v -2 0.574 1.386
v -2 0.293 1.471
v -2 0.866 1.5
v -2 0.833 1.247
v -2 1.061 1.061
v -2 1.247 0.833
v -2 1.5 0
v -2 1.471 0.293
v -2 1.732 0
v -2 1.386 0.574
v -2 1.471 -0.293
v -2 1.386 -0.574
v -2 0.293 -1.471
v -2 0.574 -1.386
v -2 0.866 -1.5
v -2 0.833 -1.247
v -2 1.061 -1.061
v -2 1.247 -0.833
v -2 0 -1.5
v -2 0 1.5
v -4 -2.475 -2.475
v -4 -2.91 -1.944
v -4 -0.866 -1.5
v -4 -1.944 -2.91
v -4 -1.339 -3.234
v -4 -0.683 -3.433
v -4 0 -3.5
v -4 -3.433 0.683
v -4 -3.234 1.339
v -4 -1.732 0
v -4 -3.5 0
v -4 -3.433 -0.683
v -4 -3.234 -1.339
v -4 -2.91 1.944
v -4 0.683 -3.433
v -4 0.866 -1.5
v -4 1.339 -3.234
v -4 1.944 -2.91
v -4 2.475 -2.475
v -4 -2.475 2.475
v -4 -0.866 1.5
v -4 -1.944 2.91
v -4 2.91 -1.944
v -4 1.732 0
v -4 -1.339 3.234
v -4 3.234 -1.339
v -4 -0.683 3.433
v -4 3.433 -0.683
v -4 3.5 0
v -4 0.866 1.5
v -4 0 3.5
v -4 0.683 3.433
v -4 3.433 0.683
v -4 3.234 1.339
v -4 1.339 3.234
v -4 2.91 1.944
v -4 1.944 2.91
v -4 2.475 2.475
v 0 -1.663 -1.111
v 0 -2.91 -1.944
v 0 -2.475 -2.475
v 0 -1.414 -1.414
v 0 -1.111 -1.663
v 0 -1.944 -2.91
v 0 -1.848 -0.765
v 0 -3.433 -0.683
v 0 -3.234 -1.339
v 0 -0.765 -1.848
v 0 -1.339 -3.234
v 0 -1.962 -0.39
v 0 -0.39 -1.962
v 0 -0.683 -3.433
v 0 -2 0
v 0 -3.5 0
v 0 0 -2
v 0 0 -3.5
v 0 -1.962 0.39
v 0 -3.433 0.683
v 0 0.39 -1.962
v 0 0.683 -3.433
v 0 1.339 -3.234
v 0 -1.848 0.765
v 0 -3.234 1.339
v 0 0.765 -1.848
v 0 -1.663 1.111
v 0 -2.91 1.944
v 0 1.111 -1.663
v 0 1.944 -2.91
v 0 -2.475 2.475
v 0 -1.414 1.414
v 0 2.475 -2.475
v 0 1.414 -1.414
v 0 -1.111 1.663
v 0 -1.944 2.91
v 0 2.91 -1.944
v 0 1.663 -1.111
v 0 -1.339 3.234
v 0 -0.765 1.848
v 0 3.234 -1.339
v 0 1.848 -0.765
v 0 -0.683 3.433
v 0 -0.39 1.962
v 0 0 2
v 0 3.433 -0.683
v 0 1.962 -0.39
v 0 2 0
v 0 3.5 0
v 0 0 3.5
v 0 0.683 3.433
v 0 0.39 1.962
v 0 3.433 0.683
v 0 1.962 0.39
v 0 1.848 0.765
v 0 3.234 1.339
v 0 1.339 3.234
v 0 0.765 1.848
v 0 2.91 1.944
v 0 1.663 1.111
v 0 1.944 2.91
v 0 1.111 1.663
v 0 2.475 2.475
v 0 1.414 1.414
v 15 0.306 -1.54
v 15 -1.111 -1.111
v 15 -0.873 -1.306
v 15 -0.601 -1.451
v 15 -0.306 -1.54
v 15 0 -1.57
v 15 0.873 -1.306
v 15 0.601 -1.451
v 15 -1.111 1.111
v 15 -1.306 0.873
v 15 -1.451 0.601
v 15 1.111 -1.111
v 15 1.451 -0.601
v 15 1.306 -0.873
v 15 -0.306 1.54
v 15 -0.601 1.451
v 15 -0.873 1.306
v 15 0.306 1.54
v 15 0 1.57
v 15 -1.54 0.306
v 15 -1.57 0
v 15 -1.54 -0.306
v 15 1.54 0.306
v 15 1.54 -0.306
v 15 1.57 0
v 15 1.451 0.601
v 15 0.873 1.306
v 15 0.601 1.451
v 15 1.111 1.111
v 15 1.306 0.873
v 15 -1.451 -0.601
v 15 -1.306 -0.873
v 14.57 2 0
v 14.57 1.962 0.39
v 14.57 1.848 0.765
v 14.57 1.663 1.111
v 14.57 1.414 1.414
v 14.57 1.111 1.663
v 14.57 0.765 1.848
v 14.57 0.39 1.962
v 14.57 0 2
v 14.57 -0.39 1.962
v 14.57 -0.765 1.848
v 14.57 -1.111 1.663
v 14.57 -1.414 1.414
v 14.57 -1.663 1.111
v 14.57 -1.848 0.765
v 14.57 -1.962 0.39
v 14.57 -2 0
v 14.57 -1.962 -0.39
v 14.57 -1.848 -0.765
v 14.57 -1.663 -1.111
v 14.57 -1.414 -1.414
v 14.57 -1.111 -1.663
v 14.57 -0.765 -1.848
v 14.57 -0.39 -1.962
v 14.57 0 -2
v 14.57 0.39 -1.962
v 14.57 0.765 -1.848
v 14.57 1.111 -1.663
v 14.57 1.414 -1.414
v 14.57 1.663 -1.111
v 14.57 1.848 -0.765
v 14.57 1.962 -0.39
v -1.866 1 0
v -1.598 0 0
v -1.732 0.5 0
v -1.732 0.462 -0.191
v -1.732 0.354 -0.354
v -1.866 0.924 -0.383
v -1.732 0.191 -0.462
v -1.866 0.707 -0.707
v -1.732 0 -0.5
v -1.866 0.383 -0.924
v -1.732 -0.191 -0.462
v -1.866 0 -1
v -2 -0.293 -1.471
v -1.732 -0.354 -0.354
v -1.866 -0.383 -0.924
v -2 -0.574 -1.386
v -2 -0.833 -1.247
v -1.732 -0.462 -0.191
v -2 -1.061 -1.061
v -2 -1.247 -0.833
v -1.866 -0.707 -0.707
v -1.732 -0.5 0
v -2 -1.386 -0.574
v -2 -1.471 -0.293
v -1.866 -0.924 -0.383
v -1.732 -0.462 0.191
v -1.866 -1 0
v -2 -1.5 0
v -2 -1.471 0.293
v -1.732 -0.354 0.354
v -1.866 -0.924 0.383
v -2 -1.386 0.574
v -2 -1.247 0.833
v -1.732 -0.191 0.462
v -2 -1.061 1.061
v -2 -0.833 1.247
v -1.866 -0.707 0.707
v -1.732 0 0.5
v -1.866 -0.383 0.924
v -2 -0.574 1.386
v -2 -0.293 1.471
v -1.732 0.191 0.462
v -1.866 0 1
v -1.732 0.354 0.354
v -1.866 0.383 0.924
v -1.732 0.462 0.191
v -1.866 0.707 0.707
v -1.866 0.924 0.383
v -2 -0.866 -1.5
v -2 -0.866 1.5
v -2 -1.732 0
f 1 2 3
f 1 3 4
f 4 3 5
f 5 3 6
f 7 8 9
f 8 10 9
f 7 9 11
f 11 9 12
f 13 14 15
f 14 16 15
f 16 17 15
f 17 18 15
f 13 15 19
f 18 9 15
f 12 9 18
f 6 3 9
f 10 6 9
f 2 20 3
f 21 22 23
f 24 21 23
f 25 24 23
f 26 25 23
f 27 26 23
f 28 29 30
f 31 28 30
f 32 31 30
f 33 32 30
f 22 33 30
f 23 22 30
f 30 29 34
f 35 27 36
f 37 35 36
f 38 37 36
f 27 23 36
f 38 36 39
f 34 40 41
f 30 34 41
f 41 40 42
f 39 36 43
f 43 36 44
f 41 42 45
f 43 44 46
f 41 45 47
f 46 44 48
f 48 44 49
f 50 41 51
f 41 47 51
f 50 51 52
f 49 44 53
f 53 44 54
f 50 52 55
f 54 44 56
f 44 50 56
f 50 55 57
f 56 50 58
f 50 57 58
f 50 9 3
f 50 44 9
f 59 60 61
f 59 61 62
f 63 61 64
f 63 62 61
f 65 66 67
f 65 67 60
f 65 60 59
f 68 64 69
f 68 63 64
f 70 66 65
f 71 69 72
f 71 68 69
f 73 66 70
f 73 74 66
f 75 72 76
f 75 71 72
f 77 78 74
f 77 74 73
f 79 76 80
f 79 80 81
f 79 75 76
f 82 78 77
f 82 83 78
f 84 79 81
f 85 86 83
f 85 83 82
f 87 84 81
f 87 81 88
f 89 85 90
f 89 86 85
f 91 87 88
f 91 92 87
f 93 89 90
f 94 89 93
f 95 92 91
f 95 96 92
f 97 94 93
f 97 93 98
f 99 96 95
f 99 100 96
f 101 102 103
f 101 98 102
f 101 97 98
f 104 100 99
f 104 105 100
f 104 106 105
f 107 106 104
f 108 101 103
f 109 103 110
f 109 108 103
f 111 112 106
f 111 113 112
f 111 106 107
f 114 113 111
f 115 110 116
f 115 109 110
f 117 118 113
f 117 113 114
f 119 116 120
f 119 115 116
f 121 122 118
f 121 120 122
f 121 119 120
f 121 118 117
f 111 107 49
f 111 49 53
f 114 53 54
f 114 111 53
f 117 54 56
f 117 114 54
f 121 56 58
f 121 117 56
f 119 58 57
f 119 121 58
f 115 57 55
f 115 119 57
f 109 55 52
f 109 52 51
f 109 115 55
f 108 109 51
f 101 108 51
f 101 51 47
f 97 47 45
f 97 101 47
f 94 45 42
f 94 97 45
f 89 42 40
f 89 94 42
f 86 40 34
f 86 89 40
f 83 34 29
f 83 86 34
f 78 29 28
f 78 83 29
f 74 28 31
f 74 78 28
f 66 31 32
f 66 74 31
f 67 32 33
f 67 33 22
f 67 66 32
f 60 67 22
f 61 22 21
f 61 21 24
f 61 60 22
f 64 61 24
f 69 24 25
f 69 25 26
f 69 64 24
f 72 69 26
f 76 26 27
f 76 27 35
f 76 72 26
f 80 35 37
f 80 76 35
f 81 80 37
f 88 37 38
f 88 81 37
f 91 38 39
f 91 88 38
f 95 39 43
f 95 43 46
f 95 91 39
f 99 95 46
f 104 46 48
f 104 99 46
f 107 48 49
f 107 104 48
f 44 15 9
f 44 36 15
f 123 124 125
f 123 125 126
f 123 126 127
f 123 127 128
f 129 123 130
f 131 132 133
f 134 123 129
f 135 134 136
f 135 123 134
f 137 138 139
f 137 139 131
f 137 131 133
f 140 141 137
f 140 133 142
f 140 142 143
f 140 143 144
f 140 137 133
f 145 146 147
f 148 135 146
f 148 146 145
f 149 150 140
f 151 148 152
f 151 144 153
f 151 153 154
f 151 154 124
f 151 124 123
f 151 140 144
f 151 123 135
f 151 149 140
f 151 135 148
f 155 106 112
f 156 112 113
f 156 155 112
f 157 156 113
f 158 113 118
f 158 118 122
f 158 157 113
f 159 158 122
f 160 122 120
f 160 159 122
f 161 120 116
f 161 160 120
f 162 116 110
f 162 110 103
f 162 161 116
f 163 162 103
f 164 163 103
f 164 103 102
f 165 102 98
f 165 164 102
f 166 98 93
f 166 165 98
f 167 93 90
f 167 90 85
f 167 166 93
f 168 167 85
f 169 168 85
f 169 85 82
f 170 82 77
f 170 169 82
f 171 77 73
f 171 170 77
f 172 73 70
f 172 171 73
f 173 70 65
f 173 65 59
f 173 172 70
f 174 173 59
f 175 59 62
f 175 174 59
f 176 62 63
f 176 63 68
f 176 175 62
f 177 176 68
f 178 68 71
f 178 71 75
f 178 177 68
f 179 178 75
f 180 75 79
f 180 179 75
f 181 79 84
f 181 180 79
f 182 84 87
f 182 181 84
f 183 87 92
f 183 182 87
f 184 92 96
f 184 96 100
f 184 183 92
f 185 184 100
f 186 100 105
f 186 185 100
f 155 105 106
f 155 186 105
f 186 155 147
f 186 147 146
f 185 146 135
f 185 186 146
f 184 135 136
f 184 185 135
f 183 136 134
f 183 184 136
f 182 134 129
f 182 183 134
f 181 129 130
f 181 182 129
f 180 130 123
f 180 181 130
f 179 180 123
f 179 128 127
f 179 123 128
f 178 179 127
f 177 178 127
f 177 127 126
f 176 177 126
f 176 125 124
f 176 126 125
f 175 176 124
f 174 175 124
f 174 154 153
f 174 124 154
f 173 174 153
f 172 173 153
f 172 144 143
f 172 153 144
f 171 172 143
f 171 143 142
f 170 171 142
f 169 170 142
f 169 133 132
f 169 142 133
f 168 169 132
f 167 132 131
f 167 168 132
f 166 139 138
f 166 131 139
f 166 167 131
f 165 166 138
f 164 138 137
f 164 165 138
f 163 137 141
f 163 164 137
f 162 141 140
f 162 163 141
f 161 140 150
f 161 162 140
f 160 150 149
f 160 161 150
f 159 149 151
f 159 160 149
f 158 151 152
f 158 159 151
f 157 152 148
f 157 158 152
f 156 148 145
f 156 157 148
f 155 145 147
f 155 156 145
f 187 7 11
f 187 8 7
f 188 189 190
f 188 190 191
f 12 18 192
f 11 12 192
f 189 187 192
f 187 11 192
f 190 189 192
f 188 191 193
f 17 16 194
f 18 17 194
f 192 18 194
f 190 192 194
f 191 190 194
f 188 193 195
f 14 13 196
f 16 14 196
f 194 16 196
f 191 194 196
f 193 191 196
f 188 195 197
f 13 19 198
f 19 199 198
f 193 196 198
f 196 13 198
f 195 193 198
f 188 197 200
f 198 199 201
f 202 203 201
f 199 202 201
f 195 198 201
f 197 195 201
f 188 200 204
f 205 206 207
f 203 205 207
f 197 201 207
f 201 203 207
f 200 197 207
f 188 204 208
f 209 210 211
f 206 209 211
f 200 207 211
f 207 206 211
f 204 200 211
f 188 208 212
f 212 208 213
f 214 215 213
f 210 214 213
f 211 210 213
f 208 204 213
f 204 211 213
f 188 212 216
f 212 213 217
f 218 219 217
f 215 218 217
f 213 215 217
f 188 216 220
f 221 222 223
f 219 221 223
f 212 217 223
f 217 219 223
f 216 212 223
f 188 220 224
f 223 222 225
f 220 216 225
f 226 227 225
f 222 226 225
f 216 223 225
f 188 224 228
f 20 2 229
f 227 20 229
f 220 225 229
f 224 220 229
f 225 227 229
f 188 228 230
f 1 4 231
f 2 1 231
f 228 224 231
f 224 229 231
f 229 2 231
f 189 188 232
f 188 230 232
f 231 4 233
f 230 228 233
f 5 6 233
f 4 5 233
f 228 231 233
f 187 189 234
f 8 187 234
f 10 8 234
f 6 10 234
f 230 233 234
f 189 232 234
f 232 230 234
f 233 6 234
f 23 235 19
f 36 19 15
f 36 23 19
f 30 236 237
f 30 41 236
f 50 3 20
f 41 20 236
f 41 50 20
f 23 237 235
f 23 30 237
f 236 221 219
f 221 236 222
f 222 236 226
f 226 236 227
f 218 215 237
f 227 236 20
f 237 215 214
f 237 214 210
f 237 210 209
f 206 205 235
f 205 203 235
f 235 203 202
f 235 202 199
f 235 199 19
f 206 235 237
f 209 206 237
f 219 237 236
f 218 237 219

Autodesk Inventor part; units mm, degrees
sketch "Sketch_1" plane through (0, 0, 0) normal (0, 0, 1) x (1, 0, 0)
  line L0 (15, 0) -> (-4, 0)
  line L1 (-4, 0) -> (-4, 3.5)
  line L2 (-4, 3.5) -> (0, 3.5)
  line L3 (0, 3.5) -> (0, 2)
  line L4 (0, 2) -> (14.5705, 2)
  line L5 (14.5705, 2) -> (15, 1.5705)
  line L6 (15, 1.5705) -> (15, 0)
  line L7 (15, 0) -> (-4, 0)
revolve "Revolution1" add sketch "Sketch_1" angle 360 about axis through (15, 0, 0) along (1, 0, 0)
thread "Thread1" size "M4x0.7" class "6g" standard "ISO Metric profile" length 14.5 offset 0.5
sketch "Sketch_4" plane through (0, 0, 0) normal (0, 0, 1) x (1, 0, 0)
  line L0 (-1.5981, 0) -> (-4, 0)
  line L1 (-4, 0) -> (-4, 1.5)
  line L2 (-4, 1.5) -> (-2, 1.5)
  line L3 (-2, 1.5) -> (-1.5981, 0)
  line L4 (-1.5981, 0) -> (-4, 0)
revolve "Revolution2" cut sketch "Sketch_4" angle 360 about axis through (-1.5981, 0, 0) along (1, 0, 0)
sketch "Sketch_3" plane through (-4, 0, 0) normal (1, 0, 0) x (0, 0, -1)
  line L0 (-1.5, 0.866) -> (-1.5, -0.866)
  line L1 (-1.5, -0.866) -> (0, -1.7321)
  line L2 (0, -1.7321) -> (1.5, -0.866)
  line L3 (1.5, -0.866) -> (1.5, 0.866)
  line L4 (1.5, 0.866) -> (0, 1.7321)
  line L5 (0, 1.7321) -> (-1.5, 0.866)
extrude "Extrusion1" cut sketch "Sketch_3" along normal blind 2
ref_plane "bolt_XY" through (0, 0, 0) normal (1, 0, 0) x (0, 0, -1)
ref_plane "bolt_YZ" through (0, 0, 0) normal (0, 0, -1) x (0, 1, 0)
ref_plane "bolt_ZX" through (0, 0, 0) normal (0, 1, 0) x (1, 0, 0)
ref_plane "nut_XY" through (15, 0, 0) normal (1, 0, 0) x (0, 0, -1)
ref_plane "nut_YZ" through (15, 0, 0) normal (0, 0, -1) x (0, 1, 0)
ref_plane "nut_ZX" through (15, 0, 0) normal (0, 1, 0) x (1, 0, 0)
properties part number "CBM4-15" material "MISUMI"
